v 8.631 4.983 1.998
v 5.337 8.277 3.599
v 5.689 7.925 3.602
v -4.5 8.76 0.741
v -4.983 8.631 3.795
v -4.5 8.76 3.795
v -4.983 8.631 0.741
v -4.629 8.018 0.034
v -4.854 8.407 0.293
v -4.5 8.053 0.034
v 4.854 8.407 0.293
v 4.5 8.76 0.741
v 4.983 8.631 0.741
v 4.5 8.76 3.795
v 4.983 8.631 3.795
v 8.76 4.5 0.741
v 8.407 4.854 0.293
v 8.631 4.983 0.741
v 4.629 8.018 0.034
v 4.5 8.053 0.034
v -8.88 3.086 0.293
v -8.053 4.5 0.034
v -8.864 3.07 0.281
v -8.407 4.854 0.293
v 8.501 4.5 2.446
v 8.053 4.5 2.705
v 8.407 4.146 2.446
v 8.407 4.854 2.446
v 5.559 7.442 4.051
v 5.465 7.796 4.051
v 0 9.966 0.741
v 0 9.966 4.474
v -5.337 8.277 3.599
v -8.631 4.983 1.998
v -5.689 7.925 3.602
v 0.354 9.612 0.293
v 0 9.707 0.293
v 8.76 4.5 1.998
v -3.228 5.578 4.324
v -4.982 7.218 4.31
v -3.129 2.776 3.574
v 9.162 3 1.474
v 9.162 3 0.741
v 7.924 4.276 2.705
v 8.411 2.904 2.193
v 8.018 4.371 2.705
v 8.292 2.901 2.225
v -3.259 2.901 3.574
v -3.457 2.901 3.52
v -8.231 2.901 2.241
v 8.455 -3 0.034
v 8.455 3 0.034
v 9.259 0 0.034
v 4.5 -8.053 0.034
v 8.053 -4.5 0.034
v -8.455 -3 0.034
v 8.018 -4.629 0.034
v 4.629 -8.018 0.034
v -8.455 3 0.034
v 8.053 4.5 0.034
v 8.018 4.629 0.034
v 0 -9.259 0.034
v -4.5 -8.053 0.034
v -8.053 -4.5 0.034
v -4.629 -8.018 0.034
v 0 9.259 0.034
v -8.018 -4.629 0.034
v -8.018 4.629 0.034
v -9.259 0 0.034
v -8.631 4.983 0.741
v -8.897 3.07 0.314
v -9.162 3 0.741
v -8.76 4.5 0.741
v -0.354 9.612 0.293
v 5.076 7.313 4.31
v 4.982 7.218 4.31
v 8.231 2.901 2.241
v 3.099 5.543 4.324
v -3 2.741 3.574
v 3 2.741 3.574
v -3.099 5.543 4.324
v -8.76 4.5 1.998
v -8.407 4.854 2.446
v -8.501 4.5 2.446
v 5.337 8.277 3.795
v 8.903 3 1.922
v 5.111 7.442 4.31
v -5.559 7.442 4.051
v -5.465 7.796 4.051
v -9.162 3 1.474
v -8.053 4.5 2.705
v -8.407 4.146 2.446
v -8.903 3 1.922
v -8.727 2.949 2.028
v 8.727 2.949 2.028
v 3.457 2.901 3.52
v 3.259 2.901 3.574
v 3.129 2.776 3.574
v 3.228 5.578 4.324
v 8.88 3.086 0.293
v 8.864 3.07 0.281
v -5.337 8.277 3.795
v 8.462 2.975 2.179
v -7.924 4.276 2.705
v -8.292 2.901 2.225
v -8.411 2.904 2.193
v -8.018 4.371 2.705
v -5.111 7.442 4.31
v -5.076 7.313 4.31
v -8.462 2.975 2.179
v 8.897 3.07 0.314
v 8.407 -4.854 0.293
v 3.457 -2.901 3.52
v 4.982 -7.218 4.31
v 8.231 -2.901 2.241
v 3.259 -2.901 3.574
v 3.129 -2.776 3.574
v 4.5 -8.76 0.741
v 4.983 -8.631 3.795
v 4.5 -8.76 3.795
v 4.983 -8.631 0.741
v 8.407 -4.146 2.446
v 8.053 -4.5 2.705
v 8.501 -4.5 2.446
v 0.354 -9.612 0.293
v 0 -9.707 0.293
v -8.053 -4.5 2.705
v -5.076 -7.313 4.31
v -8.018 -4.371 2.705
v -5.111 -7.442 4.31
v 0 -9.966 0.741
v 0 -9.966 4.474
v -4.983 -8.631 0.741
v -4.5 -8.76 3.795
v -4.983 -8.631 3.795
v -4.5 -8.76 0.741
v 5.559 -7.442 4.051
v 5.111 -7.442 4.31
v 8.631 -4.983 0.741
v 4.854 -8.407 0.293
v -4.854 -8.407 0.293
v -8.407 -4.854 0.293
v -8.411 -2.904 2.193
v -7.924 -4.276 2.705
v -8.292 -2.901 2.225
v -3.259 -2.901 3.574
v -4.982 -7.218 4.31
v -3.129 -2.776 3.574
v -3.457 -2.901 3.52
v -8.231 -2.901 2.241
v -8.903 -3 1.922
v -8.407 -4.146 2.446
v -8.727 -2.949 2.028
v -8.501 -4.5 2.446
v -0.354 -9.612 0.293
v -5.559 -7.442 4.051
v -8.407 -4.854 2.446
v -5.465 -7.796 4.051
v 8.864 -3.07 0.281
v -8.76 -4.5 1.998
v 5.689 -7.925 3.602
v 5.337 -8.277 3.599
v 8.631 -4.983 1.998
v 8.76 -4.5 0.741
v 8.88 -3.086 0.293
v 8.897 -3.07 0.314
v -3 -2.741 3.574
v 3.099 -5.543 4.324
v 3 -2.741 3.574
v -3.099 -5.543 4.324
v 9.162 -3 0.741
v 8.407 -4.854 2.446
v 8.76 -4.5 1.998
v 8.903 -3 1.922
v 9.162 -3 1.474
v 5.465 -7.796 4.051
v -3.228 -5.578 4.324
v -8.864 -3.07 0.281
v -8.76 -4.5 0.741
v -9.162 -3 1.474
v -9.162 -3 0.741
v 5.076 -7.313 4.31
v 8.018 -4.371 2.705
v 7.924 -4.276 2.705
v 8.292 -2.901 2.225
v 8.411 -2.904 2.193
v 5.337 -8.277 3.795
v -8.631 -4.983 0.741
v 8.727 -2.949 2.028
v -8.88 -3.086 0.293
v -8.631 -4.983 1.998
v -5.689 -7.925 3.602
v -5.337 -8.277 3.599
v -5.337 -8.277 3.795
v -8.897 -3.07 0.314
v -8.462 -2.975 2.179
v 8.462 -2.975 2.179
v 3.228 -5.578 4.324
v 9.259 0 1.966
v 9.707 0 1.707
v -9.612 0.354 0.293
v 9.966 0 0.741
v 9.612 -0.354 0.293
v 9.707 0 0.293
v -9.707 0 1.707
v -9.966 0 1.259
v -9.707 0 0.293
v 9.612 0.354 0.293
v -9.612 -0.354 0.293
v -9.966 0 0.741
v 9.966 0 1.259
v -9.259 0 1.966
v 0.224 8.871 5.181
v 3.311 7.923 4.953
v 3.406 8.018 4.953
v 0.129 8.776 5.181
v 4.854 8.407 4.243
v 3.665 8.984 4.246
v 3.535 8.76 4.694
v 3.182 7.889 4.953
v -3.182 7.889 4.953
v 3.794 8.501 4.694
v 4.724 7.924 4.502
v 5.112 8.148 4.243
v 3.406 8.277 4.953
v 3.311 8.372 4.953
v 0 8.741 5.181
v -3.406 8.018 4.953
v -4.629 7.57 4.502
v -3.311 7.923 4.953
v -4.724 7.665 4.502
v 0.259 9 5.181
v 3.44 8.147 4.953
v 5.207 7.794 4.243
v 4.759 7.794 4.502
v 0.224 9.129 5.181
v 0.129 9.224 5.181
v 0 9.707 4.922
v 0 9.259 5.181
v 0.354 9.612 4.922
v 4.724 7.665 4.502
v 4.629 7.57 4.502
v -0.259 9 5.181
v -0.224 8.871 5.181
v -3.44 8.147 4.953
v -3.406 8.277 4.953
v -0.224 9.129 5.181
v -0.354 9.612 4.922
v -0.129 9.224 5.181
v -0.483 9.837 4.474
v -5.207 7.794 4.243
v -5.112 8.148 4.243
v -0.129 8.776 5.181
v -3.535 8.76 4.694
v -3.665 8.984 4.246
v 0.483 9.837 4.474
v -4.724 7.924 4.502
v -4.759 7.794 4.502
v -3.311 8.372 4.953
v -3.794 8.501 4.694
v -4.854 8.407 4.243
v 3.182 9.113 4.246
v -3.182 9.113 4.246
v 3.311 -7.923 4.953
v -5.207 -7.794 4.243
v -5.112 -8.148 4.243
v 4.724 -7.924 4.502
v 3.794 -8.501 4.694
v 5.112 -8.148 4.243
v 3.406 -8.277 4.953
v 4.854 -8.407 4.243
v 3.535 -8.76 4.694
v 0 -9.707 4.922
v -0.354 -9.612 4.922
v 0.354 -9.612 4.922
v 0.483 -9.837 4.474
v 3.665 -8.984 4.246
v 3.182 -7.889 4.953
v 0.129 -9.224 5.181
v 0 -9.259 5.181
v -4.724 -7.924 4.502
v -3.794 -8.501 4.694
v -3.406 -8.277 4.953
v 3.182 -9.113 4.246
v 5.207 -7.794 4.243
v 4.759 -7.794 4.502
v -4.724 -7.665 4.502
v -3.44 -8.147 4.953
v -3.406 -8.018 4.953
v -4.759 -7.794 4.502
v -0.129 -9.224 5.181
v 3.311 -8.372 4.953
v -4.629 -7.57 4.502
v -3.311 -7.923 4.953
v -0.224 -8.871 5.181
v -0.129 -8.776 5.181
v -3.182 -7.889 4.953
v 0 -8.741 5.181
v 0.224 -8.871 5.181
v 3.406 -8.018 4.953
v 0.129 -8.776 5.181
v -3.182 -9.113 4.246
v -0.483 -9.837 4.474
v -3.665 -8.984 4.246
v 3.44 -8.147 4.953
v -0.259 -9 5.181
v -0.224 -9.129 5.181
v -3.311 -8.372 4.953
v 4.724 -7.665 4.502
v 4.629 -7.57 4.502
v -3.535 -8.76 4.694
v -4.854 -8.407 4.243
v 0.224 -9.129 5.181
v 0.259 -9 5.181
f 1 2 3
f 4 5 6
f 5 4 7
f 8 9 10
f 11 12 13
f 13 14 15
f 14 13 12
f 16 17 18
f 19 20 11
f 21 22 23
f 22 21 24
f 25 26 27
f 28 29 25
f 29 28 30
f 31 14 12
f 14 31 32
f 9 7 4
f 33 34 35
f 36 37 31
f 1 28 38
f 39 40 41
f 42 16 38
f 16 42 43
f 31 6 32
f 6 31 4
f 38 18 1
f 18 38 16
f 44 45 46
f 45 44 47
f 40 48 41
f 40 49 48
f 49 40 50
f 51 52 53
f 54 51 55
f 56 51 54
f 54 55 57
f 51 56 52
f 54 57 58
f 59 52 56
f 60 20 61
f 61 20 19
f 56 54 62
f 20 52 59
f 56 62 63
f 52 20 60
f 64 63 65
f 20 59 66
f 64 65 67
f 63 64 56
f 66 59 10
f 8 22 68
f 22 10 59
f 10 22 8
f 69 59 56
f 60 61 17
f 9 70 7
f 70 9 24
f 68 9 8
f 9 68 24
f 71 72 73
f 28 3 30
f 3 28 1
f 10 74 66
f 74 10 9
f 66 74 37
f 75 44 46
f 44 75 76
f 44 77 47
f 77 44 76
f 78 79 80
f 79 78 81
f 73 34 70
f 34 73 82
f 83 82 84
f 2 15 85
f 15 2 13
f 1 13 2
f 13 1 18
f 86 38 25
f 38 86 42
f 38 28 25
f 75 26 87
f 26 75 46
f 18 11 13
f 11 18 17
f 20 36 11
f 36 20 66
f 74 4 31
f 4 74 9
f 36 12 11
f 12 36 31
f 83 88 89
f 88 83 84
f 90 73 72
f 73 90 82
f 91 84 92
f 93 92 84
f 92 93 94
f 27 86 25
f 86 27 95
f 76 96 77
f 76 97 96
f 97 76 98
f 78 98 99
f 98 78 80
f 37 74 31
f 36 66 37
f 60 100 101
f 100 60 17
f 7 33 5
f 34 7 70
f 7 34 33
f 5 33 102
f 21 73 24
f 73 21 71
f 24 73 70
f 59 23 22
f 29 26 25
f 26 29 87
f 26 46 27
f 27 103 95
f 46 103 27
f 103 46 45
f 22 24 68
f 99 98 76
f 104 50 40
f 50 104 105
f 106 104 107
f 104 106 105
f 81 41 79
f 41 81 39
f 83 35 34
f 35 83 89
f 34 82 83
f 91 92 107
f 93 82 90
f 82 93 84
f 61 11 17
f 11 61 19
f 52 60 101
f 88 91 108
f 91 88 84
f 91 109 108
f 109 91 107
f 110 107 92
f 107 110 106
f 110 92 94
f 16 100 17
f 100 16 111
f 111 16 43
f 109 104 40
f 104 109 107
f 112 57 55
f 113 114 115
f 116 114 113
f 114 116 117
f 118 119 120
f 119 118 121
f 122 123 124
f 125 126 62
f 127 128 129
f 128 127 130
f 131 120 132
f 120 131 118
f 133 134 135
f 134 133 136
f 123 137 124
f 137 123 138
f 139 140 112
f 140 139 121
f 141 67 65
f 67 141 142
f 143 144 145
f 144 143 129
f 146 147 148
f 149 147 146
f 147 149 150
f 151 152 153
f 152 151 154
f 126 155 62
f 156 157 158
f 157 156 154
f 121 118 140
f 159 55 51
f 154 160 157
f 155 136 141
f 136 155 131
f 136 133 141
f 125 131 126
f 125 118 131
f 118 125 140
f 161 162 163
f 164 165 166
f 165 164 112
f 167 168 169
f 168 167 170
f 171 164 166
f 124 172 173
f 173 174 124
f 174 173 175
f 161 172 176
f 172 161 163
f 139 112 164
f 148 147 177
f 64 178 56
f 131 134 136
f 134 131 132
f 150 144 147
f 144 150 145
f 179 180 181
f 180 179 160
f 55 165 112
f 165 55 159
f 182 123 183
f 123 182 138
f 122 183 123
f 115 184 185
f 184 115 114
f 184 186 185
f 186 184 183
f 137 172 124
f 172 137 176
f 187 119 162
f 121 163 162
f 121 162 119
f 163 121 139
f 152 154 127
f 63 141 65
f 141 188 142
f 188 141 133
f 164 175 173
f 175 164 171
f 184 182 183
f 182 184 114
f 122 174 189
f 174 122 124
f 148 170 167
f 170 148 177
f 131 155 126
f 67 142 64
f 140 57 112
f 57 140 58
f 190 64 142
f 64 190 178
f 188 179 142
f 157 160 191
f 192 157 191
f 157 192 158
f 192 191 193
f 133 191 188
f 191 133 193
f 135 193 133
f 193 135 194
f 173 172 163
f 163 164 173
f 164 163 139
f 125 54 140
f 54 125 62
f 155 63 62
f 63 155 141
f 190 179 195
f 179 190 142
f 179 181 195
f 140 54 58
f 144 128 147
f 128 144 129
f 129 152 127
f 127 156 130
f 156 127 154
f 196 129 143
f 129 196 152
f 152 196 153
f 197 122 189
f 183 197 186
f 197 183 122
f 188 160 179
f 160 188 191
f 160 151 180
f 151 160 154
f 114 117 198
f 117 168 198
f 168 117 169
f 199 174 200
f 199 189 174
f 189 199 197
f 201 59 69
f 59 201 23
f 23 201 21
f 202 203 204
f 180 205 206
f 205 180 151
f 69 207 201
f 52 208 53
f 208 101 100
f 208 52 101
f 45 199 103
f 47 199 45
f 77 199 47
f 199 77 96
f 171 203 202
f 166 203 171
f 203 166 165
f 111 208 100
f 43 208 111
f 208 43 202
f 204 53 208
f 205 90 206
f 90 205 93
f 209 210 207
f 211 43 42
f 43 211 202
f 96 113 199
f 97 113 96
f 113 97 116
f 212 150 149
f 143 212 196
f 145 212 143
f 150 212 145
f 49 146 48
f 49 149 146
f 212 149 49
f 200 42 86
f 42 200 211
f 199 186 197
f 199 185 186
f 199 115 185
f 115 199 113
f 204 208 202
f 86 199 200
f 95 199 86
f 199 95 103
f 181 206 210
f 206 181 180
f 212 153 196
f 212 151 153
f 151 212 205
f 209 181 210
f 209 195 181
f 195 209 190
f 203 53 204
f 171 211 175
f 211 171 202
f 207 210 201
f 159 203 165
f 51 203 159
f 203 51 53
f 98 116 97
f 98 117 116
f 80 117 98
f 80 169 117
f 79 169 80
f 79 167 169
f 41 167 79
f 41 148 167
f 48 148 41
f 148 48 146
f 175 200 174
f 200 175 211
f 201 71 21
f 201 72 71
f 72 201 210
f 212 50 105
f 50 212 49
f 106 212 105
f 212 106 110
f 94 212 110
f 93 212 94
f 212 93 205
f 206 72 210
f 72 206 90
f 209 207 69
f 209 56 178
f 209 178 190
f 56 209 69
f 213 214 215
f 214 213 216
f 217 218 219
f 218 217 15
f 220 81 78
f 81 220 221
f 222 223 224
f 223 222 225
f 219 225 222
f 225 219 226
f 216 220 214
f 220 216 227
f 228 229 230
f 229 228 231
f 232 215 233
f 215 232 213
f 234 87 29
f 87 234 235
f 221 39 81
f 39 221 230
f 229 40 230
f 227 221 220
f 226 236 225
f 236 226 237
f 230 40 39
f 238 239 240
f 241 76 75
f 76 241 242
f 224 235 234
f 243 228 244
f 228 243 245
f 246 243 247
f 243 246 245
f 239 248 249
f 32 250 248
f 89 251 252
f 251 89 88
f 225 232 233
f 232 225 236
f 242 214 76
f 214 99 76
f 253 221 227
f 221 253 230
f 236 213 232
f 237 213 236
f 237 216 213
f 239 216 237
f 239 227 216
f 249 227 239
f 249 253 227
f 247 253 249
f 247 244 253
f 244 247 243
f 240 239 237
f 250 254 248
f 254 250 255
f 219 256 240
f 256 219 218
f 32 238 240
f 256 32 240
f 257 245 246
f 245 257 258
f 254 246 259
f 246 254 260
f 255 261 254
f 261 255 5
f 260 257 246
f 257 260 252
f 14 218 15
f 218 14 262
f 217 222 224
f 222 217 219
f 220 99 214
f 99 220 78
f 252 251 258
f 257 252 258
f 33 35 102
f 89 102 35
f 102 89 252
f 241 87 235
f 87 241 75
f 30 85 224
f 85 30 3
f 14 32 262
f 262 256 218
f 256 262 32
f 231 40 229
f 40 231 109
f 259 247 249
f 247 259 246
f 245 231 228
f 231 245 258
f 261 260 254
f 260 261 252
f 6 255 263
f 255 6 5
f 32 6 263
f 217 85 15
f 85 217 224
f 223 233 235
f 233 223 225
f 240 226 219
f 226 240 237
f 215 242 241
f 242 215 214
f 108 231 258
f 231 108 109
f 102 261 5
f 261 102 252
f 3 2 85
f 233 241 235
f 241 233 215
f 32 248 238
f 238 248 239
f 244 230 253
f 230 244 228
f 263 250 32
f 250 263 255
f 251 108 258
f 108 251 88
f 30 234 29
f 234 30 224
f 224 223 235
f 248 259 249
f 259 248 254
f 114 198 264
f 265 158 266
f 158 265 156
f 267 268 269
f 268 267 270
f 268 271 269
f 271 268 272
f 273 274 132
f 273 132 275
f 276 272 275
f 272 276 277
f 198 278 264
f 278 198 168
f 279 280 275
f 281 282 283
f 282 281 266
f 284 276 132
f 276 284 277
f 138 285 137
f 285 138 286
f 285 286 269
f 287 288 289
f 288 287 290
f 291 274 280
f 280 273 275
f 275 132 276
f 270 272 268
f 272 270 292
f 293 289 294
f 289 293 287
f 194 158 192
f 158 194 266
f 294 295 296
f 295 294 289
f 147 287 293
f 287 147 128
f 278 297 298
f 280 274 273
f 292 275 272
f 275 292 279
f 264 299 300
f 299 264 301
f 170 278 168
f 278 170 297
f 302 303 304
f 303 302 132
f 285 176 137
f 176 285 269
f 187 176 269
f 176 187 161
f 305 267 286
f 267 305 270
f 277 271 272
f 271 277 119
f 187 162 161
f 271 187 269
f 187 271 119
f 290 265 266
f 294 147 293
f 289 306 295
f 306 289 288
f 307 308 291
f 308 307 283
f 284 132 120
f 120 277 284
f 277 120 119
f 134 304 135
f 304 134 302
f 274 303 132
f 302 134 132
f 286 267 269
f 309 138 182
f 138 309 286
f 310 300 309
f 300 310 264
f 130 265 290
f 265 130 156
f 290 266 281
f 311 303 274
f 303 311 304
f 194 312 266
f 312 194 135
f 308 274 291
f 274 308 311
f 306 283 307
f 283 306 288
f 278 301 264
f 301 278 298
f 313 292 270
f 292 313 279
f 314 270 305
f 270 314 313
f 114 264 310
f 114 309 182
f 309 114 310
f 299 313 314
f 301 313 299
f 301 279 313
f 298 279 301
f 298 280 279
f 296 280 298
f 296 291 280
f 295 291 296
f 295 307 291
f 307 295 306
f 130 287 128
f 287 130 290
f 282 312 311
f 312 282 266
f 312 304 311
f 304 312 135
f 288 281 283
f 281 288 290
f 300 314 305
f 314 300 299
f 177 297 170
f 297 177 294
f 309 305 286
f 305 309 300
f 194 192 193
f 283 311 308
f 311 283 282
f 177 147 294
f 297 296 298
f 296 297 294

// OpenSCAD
// file: ../settings.scad
/*
 *   Edit these settings to control the generated keycaps
 */

/* height of the part the finger rests on, doesn't exclude higher protrusions,
       eg. the saddle keycap rises on either side of the thumb for leverage */
effective_height=10;

// maximum width in any direction, strict limit to prevent collision with adjacent keycaps
total_width=18;

// how thick the keycap, excluding the stem should be. mostly aesthetic preference?
minimum_thickness = 2;


keycap_style = "saddle";

/* can be auto (computationally expensive), manual (a bit janky, needs to be implemented for each keycap), or none.
     has no effect on certain keycaps such as trackpoint variants */
chamfer_style = "auto";

/* this allows you to rotate the keycap if the finger approaches at an angle
   you probably only want to rotate the Z-axis (third value) */
keycap_rotation = [0,0,0];

stem_model = "SKQU";



/* -----------------------------------------------------------------------
 *  Do Not Edit - this machinery is consistent regardless of above values
 * -----------------------------------------------------------------------
 */

keycap_file = str("keycaps/",keycap_style,".scad");
//function import_cap() = use <keycap_file>;
/*
module import_stem() {
  if (stem_model == "SKQU") {
    include <SKQU.scad>;
  } else {
    assert(false, "please select a valid stem_model in settings.scad");
  }
  }*/

function auto_chamfer() = chamfer_style == "auto";


function manual_chamfer() = chamfer_style == "manual";
// main file
/*
 *  A subtractive approach to producing a saddle kepcap
 */

include <../settings.scad>;

thumbdeflection = 15;
saddle_sheet = false;

cham_sphere_dia = auto_chamfer() ? minimum_thickness : 0;
thumbthickness = (saddle_sheet ? (minimum_thickness / cos(thumbdeflection)) : minimum_thickness) - cham_sphere_dia;
thumbdia = total_width - cham_sphere_dia;


// subtractive approach to 'carve' a saddle cap

module chamfercutter(arc=360/8, rotation=[0,0,0], center=true){
  //radius = (totalwidth/2)-(thumbthickness/2);

  //if (rotation != [0,0,0]) {
  radius = ((1/cos(rotation.y))*((total_width/2)/*-(thumbthickness/2)*/))-(thumbthickness/2);
  //}

  centering = [rotation.x,0,rotation.z - (arc/2)];
  if (!center) {
    centering = [rotation.x,0,rotation.z];
  }

  /*translate([0,0,tan(rotation.y)*totalwidth/2])*/ rotate(centering) rotate_extrude(angle=arc) {
    rotate([0,0,rotation.y]) translate([radius,0,0]) difference(){
      rotate([0,0,-rotation.y]) square(thumbthickness);
      circle(d=thumbthickness);
    }
  }
}

panel_width = total_width/3;
spacer=tan(thumbdeflection)*panel_width;
offset=panel_width/2;
depth= thumbthickness+(2*spacer);

function height_offset() = minimum_thickness + (saddle_sheet ? 0 : spacer);

module subtractivecap(chamfer=false){
  //translate([0,0,-spacer])
  difference() {
    // workpiece
    cylinder(h=depth,d=total_width);

    //center
    translate([-offset,-offset,spacer+thumbthickness]) cube([panel_width, panel_width,depth]);

    // downslopes
    translate([offset,-offset,spacer+thumbthickness]) rotate([0,thumbdeflection,0])
      translate([-offset, 0,0]) cube([total_width, panel_width,depth]);
    translate([-offset,-offset,spacer+thumbthickness]) mirror([1,0,0]) rotate([0,thumbdeflection,0])
      translate([-offset,0,0]) cube([total_width, panel_width,depth]);

    if (chamfer) {
      translate([0,0,thumbthickness]) chamfercutter(41,[0,-thumbdeflection,0]);
      translate([0,0,thumbthickness]) mirror([1,0,0]) chamfercutter(41, [0,-thumbdeflection,0]);
    }
    // upslopes
    translate([-total_width/2,offset,spacer+thumbthickness]) rotate([thumbdeflection,0,0])  cube([total_width, total_width,depth]);
    translate([-total_width/2,-offset,spacer+thumbthickness]) mirror([0,1,0]) rotate([thumbdeflection,0,0]) cube([total_width, total_width,depth]);

    if (chamfer) {
      translate([0,0,thumbthickness]) chamfercutter(43, [0,thumbdeflection,90]);
      translate([0,0,thumbthickness]) mirror([0,1,0]) chamfercutter(43, [0,thumbdeflection,90]);
    }

    // quarters
    translate([offset, offset,spacer+thumbthickness])
      rotate([thumbdeflection,thumbdeflection,0])
      translate([-offset, 0,0]) cube([total_width, total_width,depth]);
    translate([-offset, offset,spacer+thumbthickness]) mirror([1,0,0])
      rotate([thumbdeflection,thumbdeflection,0])
      translate([-offset, 0,0]) cube([total_width, total_width,depth]);
    translate([offset, -offset,spacer+thumbthickness]) mirror([0,1,0])
      rotate([thumbdeflection,thumbdeflection,0])
      translate([-offset, 0,0]) cube([total_width, total_width,depth]);
    translate([-offset, -offset,spacer+thumbthickness]) rotate([0,0,180])
      rotate([thumbdeflection,thumbdeflection,0])
      translate([-offset, 0,0]) cube([total_width, total_width,depth]);


    //translate([0,0,thumbthickness]) rotate([0,0,-45]) chamfercutter(53, [-thumbdeflection,-thumbdeflection,0]);
    //translate([0,0,thumbthickness]) rotate([0,0,-45-180]) chamfercutter(53, [-thumbdeflection,-thumbdeflection,0]);


    //translate([0,0,thumbthickness]) rotate([0,0,45]) mirror([1,0,0]) chamfercutter(53, [-thumbdeflection,-thumbdeflection,0]);
    //translate([0,0,thumbthickness]) rotate([0,0,45+180]) mirror([1,0,0]) chamfercutter(53, [-thumbdeflection,-thumbdeflection,0]);



    // bottom chamfer
    if (chamfer) {
      translate([0,0,thumbthickness/2]) mirror([0,0,1]) chamfercutter(360);
    }
    //translate([0,0,thumbthickness/2]) chamfercutter(360);

      /*rotate_extrude(angle=360) {
      translate([(totalwidth/2)-(thumbthickness/2),0,0]) difference(){
      square(thumbthickness);
	circle(d=thumbthickness);
      }
      }*/
  }
}

module saddle_sheet() {
  translate([0,0,-spacer]) difference() {
    subtractivecap(false);
    translate([0,0,-thumbthickness]) subtractivecap();
  }
}

module cap() {
  if (auto_chamfer()) {
    minkowski(){
      if (saddle_sheet) {
	saddle_sheet();
      }else{
	subtractivecap(false);
      }
      // sphere is off-center so we don't grow in the -z direction and the cap stays positioned with the bottom on the origin
      translate([0,0,cham_sphere_dia/2]) sphere(d=cham_sphere_dia);
    }
  } else {
      if (saddle_sheet) {
	// XXX: implement manual chamfer?
	saddle_sheet();
      }else{
	subtractivecap(manual_chamfer());
      }
  }
}

cap($fn=12);

//translate([0,0,spacer+thumbthickness]) rotate([0,thumbdeflection,0]) chamfercutter();
//translate([0,0,thumbthickness])  rotate([0,-thumbdeflection,90]) chamfercutter(41);
//translate([0,0,thumbthickness]) rotate([0,-thumbdeflection,90]) chamfercutter(41);
//translate([0,0,thumbthickness]) mirror([0,1,0]) rotate([0,-thumbdeflection,90]) chamfercutter(41);
/*rotate([0,0,-thumbdeflection]) translate([((1/cos(20))*totalwidth/2) -(thumbthickness/2),0,0]) difference(){
    square(thumbthickness);
    circle(d=thumbthickness);
    };*/
//translate([0,0,spacer+thumbthickness]) chamfercutter(41,[0,-thumbdeflection,0]);
//chamfercutter(41,[0,-thumbdeflection,0]);
//radius = ((1/cos(20))*totalwidth/2) -(thumbthickness/2);
/*rotate_extrude(angle=arc) {
     translate([radius-1,0,0]) difference(){
      square(thumbthickness);
      translate([-1,0,0]) rotate([0,0,-20]) translate([1,0,0]) circle(d=thumbthickness);
    }
*/
//rotate([0,0,-20]) translate([1,0,0]) circle(d=thumbthickness);
//translate([0,0,thumbthickness/2]) mirror([0,0,1]) chamfercutter(360);
